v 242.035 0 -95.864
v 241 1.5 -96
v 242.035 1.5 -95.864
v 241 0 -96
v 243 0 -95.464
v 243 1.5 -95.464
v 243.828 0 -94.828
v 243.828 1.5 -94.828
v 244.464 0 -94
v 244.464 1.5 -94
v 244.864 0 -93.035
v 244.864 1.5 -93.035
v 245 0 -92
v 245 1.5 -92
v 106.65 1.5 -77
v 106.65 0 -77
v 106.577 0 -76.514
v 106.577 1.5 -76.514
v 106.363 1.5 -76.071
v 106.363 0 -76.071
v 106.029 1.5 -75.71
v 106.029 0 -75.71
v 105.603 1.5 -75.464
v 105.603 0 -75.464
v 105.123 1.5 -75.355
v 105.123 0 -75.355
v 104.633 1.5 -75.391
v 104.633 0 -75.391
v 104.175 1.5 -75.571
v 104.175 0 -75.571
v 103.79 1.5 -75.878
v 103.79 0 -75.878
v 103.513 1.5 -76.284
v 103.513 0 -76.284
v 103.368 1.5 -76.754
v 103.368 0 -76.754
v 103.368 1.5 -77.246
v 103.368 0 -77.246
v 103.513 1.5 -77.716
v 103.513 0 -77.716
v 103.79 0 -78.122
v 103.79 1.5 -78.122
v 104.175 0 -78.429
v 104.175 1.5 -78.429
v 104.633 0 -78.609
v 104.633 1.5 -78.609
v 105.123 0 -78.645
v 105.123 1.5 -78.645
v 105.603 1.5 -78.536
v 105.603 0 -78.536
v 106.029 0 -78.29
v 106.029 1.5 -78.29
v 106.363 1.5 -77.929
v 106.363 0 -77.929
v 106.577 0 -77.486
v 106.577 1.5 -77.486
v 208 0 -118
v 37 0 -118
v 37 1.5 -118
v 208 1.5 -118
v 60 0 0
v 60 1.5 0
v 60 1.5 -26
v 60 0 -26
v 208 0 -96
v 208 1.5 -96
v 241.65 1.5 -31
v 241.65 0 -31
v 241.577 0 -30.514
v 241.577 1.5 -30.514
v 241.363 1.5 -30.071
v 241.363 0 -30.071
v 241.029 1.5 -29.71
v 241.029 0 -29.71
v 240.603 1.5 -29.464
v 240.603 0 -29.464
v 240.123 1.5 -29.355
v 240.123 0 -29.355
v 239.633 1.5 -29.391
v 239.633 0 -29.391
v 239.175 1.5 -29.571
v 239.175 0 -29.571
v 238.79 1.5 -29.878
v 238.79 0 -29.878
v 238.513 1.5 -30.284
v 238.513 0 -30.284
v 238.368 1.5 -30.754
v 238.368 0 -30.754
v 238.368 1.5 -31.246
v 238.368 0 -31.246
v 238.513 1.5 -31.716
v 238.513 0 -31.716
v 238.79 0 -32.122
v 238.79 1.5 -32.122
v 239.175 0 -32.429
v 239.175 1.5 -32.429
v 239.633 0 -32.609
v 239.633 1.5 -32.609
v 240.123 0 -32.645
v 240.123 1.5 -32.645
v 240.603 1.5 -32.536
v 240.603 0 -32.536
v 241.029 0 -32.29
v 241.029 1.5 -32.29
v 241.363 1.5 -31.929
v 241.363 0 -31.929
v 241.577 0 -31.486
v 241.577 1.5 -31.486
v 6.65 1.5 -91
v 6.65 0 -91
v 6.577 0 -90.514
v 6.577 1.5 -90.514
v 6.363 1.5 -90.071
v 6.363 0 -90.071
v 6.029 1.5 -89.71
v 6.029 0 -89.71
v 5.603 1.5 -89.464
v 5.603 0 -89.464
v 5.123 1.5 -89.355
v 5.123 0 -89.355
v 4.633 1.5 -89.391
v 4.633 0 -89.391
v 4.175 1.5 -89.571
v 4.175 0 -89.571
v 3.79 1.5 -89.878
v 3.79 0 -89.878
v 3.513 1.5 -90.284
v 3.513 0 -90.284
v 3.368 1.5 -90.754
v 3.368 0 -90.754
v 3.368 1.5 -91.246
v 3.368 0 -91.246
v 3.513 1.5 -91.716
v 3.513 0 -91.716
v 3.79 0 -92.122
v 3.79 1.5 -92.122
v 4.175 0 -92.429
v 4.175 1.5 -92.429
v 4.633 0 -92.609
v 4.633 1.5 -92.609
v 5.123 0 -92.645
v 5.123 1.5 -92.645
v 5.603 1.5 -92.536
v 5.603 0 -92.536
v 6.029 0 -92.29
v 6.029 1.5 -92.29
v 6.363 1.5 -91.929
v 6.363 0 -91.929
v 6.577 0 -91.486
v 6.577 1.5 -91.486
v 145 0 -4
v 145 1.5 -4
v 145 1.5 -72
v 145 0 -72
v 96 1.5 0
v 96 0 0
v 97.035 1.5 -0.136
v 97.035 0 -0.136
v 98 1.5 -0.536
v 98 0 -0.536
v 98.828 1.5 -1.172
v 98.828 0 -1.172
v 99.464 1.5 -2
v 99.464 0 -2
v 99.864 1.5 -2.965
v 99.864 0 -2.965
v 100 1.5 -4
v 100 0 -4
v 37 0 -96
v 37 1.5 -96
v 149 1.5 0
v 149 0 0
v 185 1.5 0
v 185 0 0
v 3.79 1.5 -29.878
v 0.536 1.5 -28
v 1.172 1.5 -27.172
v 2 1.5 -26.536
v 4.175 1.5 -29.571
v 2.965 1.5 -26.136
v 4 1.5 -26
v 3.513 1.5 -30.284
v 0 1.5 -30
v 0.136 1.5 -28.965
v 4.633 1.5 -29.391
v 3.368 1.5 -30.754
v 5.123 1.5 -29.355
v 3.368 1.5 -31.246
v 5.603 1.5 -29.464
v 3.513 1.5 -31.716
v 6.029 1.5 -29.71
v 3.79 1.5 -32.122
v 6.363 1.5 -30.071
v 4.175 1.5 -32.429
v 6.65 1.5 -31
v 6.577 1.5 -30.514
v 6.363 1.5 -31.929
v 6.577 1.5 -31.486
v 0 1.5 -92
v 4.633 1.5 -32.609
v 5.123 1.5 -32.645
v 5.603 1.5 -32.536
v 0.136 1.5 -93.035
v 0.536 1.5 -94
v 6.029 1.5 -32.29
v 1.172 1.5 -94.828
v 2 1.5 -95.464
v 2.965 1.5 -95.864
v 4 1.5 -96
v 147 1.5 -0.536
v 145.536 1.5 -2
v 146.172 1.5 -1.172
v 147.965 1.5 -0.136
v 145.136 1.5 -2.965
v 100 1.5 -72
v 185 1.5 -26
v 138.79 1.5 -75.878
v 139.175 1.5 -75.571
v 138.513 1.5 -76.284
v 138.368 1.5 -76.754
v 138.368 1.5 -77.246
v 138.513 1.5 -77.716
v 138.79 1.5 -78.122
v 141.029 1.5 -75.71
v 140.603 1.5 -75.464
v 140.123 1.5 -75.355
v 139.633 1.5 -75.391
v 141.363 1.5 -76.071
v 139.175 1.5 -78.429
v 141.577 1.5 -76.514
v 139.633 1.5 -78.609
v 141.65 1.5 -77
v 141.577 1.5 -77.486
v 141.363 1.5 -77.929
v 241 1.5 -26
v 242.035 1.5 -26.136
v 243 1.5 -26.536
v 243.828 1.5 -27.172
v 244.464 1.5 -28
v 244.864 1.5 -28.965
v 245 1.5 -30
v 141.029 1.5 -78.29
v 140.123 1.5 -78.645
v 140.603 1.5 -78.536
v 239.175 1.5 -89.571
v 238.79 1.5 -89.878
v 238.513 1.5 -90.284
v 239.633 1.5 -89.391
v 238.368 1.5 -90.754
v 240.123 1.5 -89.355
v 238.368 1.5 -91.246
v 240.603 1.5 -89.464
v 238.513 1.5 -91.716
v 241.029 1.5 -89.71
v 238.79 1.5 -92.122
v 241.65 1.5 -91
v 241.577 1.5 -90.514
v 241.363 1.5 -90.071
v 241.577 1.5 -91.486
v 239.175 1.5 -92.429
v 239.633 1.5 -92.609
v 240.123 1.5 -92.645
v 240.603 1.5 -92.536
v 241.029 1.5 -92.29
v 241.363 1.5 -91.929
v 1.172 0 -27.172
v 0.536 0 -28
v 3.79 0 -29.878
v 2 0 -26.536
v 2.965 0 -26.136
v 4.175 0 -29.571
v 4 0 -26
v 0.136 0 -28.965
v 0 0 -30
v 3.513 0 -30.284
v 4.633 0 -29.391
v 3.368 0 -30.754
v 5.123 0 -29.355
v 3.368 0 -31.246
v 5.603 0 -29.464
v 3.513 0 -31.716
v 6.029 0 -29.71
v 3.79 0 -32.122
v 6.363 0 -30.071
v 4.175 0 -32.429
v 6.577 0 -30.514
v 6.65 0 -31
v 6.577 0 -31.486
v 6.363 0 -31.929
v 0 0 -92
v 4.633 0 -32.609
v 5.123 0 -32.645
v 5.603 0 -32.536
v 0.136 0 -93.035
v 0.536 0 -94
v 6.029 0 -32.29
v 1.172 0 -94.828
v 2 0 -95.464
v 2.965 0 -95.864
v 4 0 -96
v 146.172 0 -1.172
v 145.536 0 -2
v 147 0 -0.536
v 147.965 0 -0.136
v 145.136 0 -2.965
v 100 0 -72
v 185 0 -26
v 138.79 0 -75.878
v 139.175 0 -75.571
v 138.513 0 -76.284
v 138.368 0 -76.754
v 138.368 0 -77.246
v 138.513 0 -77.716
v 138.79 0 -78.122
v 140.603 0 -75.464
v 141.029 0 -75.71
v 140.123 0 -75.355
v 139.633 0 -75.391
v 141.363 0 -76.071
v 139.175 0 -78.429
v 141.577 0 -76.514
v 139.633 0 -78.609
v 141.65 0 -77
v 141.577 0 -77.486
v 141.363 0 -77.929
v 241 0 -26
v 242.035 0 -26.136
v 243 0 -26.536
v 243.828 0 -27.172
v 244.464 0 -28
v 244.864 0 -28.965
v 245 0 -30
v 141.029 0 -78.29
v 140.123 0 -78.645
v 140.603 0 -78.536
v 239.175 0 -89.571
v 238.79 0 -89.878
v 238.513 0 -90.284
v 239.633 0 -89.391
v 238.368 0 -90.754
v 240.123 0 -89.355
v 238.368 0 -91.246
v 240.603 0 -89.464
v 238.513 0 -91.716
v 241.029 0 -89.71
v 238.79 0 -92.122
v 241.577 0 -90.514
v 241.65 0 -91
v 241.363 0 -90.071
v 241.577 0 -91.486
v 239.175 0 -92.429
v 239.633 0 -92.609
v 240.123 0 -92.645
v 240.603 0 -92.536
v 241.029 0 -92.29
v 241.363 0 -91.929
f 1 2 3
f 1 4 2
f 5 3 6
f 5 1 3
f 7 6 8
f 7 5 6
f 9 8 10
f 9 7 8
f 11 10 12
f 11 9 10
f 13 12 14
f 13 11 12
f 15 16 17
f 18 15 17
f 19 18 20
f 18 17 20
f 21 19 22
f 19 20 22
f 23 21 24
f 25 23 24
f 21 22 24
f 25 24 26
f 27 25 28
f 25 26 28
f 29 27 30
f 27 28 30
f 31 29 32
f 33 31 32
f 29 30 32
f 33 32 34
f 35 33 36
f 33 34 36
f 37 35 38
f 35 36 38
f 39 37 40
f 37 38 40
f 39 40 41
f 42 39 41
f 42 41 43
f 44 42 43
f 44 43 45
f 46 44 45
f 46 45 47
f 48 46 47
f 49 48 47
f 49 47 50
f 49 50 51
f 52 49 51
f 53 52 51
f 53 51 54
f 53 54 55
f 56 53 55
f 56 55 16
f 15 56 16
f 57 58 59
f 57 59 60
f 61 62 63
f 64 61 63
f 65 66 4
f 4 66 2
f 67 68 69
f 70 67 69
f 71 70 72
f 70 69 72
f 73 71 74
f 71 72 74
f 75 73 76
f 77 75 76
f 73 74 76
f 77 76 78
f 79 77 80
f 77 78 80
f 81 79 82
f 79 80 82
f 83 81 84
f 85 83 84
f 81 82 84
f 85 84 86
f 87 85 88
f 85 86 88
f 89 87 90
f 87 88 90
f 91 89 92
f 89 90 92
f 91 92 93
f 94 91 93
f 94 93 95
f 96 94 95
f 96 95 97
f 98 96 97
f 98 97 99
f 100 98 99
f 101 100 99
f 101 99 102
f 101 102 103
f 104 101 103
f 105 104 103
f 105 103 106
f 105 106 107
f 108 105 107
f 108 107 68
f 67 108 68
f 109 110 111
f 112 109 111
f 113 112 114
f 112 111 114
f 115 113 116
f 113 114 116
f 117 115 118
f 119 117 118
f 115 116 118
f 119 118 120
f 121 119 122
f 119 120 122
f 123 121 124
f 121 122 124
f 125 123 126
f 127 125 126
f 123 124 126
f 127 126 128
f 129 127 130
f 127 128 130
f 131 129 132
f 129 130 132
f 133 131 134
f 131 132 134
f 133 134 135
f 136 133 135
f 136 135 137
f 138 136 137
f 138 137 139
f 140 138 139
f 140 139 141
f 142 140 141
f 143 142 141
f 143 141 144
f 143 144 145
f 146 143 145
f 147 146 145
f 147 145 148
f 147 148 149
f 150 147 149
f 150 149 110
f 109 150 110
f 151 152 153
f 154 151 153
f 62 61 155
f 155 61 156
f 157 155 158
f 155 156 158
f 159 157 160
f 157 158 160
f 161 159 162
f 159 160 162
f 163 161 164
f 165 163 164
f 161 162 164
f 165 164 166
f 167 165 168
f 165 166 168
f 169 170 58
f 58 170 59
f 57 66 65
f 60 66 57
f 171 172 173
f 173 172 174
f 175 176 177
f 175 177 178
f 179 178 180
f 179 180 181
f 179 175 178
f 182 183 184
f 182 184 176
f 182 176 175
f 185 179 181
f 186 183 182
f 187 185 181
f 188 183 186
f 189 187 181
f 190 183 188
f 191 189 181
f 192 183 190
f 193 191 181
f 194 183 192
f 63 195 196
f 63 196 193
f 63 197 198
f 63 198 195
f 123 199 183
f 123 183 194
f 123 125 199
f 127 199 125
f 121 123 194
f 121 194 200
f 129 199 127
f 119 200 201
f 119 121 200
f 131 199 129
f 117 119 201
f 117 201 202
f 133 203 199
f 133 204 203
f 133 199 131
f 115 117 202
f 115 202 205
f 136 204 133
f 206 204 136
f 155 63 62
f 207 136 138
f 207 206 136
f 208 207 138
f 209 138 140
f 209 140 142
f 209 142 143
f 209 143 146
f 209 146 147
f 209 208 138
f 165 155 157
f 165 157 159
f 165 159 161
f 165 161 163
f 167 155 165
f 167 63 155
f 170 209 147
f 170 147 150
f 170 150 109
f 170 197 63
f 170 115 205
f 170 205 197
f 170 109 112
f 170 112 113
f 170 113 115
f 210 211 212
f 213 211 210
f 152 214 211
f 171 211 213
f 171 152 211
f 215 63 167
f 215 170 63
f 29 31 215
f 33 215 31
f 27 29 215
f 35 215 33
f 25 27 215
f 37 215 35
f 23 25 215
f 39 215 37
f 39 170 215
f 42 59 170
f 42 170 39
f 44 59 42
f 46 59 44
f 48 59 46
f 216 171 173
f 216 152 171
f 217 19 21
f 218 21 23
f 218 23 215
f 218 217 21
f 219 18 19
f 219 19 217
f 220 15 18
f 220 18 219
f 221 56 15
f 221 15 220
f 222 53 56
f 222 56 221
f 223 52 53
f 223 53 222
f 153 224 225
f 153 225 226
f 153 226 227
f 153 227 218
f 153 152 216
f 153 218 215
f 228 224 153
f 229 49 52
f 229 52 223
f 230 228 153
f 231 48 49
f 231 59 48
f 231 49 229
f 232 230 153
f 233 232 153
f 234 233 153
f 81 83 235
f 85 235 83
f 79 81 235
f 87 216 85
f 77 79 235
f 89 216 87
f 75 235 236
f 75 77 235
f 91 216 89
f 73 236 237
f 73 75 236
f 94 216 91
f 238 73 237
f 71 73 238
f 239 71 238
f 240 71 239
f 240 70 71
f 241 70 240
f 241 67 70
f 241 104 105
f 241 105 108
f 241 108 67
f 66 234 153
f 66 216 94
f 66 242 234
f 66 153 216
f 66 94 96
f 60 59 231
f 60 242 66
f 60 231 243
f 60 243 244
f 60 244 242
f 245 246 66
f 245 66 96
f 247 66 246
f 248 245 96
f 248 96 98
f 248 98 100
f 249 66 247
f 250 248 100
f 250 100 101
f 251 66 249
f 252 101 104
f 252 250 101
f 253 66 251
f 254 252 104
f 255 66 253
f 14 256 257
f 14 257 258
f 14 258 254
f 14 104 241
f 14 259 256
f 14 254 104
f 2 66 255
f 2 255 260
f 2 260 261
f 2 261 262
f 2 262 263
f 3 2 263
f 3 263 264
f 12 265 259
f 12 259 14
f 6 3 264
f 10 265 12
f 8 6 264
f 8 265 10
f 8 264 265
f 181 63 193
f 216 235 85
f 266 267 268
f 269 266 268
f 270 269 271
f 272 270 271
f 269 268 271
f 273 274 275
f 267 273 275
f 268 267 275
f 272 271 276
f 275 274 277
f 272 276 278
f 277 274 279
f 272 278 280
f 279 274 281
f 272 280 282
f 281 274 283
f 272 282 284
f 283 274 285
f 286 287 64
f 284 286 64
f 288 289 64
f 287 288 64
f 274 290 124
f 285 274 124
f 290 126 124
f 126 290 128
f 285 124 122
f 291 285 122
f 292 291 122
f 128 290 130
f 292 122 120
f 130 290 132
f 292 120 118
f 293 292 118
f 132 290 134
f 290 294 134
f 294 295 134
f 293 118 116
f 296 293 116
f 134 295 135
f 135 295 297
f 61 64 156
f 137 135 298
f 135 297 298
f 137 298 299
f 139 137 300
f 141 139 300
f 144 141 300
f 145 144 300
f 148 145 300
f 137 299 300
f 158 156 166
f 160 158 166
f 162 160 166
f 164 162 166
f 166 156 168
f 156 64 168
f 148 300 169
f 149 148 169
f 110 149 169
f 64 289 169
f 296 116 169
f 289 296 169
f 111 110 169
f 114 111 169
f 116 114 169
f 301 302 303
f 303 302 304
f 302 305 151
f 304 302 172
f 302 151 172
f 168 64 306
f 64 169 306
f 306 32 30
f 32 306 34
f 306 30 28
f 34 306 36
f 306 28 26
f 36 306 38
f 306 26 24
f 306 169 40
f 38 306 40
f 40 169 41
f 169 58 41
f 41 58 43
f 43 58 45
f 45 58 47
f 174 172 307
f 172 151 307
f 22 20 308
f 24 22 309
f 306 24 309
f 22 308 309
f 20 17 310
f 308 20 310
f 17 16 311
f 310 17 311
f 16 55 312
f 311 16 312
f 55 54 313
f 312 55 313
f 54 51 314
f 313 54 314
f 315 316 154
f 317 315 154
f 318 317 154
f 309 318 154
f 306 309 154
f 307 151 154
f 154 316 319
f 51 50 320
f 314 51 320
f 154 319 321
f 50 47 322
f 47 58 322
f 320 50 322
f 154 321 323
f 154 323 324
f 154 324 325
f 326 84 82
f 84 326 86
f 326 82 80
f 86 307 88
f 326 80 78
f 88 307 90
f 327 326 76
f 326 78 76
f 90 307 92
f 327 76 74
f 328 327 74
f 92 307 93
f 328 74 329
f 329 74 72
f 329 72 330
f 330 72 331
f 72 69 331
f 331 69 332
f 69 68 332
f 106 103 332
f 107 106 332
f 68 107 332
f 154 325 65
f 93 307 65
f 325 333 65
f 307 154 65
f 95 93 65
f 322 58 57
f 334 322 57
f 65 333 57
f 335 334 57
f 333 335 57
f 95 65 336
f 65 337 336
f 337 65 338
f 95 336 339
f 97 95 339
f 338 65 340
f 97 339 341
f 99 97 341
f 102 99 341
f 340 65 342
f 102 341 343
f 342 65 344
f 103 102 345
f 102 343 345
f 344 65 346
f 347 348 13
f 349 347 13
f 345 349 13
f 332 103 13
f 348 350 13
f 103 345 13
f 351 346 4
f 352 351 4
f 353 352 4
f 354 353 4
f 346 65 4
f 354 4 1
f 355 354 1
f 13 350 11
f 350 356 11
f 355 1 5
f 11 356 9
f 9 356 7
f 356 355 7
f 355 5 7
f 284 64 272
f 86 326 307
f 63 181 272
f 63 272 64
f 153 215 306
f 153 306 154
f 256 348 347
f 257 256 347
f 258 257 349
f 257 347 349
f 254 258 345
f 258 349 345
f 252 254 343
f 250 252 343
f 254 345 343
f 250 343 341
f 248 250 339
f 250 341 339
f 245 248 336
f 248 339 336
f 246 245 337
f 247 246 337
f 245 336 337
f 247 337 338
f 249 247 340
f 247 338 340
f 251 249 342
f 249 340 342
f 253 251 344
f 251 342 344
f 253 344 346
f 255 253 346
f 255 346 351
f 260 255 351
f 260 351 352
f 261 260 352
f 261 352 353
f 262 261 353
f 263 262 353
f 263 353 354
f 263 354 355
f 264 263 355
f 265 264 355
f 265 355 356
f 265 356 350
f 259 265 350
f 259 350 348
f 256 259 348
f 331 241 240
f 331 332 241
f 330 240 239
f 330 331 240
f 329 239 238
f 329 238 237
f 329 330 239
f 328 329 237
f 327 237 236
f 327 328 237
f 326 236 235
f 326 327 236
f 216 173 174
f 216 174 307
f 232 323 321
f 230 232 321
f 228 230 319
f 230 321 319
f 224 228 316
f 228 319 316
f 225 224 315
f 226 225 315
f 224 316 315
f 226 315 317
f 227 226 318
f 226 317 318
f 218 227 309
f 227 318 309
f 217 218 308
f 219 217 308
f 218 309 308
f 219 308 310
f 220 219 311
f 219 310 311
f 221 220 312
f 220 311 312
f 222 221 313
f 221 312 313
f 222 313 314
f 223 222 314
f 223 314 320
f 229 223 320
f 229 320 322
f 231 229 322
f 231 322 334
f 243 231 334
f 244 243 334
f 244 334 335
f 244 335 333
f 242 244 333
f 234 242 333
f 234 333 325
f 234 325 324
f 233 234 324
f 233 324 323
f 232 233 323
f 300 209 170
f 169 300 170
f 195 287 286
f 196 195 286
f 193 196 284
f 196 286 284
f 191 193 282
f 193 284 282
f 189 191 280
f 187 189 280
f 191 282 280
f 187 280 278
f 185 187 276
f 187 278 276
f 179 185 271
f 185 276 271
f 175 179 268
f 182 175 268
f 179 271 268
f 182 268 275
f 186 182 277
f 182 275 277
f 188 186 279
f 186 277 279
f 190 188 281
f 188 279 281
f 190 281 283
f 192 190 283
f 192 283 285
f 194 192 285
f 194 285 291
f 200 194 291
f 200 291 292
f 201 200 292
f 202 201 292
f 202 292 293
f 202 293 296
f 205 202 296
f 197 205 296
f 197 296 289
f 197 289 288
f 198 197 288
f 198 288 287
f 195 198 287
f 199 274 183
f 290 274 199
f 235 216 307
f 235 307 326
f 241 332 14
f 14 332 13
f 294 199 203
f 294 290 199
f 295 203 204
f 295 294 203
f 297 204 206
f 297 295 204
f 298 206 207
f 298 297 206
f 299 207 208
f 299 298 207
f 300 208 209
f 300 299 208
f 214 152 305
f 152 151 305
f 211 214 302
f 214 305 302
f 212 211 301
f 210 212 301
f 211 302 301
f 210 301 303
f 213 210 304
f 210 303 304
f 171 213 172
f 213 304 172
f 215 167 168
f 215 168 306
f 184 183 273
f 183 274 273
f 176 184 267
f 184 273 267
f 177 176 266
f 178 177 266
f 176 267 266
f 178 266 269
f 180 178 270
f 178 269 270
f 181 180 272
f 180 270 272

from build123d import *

# Parameters (mm, degrees)
SKETCH1_W           = 245
SKETCH1_H           = 118
BOSS_EXTRUDE1_DEPTH = 1.5
SKETCH2_W           = 37
SKETCH2_H           = 22
SKETCH2_W_2         = 60
SKETCH2_H_2         = 26
SKETCH2_W_3         = 45
SKETCH2_H_3         = 72
CUT_EXTRUDE1_DEPTH  = 2.5
SKETCH3_R           = 1.65
CUT_EXTRUDE2_DEPTH  = 10
FILLET1_R           = 4


with BuildPart() as part:
    # Sketch1 → Boss-Extrude1 (new body)
    with BuildSketch(Plane(origin=(0, 0, 0), x_dir=(1, 0, 0), z_dir=(0, 1, 0))):
        with Locations((122.5, 59)):
            Rectangle(SKETCH1_W, SKETCH1_H)
    extrude(amount=BOSS_EXTRUDE1_DEPTH)

    # Sketch2 → Cut-Extrude1 (cut, through all)
    with BuildSketch(Plane(origin=(0, 1.5, 0), x_dir=(1, 0, 0), z_dir=(0, 1, 0))):
        with Locations((18.5, 107)):
            Rectangle(SKETCH2_W, SKETCH2_H)
        with Locations((30, 13)):
            Rectangle(SKETCH2_W_2, SKETCH2_H_2)
        with Locations((226.5, 107)):
            Rectangle(SKETCH2_W, SKETCH2_H)
        with Locations((215, 13)):
            Rectangle(SKETCH2_W_2, SKETCH2_H_2)
        with Locations((122.5, 36)):
            Rectangle(SKETCH2_W_3, SKETCH2_H_3)
    extrude(amount=-CUT_EXTRUDE1_DEPTH, mode=Mode.SUBTRACT)

    # Sketch3 → Cut-Extrude2 (cut)
    with BuildSketch(Plane.XZ):
        with Locations((5, -31)):
            Circle(SKETCH3_R)
        with Locations((5, -91)):
            Circle(SKETCH3_R)
        with Locations((240, -31)):
            Circle(SKETCH3_R)
        with Locations((240, -91)):
            Circle(SKETCH3_R)
        with Locations((105, -77)):
            Circle(SKETCH3_R)
        with Locations((140, -77)):
            Circle(SKETCH3_R)
    extrude(amount=-CUT_EXTRUDE2_DEPTH, mode=Mode.SUBTRACT)

    # Fillet1
    fillet1_edges = [part.edges().sort_by_distance(p)[0] for p in [
        (0, 0.75, -26),
        (245, 0.75, -96),
        (245, 0.75, -26),
        (100, 0.75, 0),
        (145, 0.75, 0),
        (0, 0.75, -96),
    ]]
    fillet(fillet1_edges, radius=FILLET1_R)


solid = part.part
